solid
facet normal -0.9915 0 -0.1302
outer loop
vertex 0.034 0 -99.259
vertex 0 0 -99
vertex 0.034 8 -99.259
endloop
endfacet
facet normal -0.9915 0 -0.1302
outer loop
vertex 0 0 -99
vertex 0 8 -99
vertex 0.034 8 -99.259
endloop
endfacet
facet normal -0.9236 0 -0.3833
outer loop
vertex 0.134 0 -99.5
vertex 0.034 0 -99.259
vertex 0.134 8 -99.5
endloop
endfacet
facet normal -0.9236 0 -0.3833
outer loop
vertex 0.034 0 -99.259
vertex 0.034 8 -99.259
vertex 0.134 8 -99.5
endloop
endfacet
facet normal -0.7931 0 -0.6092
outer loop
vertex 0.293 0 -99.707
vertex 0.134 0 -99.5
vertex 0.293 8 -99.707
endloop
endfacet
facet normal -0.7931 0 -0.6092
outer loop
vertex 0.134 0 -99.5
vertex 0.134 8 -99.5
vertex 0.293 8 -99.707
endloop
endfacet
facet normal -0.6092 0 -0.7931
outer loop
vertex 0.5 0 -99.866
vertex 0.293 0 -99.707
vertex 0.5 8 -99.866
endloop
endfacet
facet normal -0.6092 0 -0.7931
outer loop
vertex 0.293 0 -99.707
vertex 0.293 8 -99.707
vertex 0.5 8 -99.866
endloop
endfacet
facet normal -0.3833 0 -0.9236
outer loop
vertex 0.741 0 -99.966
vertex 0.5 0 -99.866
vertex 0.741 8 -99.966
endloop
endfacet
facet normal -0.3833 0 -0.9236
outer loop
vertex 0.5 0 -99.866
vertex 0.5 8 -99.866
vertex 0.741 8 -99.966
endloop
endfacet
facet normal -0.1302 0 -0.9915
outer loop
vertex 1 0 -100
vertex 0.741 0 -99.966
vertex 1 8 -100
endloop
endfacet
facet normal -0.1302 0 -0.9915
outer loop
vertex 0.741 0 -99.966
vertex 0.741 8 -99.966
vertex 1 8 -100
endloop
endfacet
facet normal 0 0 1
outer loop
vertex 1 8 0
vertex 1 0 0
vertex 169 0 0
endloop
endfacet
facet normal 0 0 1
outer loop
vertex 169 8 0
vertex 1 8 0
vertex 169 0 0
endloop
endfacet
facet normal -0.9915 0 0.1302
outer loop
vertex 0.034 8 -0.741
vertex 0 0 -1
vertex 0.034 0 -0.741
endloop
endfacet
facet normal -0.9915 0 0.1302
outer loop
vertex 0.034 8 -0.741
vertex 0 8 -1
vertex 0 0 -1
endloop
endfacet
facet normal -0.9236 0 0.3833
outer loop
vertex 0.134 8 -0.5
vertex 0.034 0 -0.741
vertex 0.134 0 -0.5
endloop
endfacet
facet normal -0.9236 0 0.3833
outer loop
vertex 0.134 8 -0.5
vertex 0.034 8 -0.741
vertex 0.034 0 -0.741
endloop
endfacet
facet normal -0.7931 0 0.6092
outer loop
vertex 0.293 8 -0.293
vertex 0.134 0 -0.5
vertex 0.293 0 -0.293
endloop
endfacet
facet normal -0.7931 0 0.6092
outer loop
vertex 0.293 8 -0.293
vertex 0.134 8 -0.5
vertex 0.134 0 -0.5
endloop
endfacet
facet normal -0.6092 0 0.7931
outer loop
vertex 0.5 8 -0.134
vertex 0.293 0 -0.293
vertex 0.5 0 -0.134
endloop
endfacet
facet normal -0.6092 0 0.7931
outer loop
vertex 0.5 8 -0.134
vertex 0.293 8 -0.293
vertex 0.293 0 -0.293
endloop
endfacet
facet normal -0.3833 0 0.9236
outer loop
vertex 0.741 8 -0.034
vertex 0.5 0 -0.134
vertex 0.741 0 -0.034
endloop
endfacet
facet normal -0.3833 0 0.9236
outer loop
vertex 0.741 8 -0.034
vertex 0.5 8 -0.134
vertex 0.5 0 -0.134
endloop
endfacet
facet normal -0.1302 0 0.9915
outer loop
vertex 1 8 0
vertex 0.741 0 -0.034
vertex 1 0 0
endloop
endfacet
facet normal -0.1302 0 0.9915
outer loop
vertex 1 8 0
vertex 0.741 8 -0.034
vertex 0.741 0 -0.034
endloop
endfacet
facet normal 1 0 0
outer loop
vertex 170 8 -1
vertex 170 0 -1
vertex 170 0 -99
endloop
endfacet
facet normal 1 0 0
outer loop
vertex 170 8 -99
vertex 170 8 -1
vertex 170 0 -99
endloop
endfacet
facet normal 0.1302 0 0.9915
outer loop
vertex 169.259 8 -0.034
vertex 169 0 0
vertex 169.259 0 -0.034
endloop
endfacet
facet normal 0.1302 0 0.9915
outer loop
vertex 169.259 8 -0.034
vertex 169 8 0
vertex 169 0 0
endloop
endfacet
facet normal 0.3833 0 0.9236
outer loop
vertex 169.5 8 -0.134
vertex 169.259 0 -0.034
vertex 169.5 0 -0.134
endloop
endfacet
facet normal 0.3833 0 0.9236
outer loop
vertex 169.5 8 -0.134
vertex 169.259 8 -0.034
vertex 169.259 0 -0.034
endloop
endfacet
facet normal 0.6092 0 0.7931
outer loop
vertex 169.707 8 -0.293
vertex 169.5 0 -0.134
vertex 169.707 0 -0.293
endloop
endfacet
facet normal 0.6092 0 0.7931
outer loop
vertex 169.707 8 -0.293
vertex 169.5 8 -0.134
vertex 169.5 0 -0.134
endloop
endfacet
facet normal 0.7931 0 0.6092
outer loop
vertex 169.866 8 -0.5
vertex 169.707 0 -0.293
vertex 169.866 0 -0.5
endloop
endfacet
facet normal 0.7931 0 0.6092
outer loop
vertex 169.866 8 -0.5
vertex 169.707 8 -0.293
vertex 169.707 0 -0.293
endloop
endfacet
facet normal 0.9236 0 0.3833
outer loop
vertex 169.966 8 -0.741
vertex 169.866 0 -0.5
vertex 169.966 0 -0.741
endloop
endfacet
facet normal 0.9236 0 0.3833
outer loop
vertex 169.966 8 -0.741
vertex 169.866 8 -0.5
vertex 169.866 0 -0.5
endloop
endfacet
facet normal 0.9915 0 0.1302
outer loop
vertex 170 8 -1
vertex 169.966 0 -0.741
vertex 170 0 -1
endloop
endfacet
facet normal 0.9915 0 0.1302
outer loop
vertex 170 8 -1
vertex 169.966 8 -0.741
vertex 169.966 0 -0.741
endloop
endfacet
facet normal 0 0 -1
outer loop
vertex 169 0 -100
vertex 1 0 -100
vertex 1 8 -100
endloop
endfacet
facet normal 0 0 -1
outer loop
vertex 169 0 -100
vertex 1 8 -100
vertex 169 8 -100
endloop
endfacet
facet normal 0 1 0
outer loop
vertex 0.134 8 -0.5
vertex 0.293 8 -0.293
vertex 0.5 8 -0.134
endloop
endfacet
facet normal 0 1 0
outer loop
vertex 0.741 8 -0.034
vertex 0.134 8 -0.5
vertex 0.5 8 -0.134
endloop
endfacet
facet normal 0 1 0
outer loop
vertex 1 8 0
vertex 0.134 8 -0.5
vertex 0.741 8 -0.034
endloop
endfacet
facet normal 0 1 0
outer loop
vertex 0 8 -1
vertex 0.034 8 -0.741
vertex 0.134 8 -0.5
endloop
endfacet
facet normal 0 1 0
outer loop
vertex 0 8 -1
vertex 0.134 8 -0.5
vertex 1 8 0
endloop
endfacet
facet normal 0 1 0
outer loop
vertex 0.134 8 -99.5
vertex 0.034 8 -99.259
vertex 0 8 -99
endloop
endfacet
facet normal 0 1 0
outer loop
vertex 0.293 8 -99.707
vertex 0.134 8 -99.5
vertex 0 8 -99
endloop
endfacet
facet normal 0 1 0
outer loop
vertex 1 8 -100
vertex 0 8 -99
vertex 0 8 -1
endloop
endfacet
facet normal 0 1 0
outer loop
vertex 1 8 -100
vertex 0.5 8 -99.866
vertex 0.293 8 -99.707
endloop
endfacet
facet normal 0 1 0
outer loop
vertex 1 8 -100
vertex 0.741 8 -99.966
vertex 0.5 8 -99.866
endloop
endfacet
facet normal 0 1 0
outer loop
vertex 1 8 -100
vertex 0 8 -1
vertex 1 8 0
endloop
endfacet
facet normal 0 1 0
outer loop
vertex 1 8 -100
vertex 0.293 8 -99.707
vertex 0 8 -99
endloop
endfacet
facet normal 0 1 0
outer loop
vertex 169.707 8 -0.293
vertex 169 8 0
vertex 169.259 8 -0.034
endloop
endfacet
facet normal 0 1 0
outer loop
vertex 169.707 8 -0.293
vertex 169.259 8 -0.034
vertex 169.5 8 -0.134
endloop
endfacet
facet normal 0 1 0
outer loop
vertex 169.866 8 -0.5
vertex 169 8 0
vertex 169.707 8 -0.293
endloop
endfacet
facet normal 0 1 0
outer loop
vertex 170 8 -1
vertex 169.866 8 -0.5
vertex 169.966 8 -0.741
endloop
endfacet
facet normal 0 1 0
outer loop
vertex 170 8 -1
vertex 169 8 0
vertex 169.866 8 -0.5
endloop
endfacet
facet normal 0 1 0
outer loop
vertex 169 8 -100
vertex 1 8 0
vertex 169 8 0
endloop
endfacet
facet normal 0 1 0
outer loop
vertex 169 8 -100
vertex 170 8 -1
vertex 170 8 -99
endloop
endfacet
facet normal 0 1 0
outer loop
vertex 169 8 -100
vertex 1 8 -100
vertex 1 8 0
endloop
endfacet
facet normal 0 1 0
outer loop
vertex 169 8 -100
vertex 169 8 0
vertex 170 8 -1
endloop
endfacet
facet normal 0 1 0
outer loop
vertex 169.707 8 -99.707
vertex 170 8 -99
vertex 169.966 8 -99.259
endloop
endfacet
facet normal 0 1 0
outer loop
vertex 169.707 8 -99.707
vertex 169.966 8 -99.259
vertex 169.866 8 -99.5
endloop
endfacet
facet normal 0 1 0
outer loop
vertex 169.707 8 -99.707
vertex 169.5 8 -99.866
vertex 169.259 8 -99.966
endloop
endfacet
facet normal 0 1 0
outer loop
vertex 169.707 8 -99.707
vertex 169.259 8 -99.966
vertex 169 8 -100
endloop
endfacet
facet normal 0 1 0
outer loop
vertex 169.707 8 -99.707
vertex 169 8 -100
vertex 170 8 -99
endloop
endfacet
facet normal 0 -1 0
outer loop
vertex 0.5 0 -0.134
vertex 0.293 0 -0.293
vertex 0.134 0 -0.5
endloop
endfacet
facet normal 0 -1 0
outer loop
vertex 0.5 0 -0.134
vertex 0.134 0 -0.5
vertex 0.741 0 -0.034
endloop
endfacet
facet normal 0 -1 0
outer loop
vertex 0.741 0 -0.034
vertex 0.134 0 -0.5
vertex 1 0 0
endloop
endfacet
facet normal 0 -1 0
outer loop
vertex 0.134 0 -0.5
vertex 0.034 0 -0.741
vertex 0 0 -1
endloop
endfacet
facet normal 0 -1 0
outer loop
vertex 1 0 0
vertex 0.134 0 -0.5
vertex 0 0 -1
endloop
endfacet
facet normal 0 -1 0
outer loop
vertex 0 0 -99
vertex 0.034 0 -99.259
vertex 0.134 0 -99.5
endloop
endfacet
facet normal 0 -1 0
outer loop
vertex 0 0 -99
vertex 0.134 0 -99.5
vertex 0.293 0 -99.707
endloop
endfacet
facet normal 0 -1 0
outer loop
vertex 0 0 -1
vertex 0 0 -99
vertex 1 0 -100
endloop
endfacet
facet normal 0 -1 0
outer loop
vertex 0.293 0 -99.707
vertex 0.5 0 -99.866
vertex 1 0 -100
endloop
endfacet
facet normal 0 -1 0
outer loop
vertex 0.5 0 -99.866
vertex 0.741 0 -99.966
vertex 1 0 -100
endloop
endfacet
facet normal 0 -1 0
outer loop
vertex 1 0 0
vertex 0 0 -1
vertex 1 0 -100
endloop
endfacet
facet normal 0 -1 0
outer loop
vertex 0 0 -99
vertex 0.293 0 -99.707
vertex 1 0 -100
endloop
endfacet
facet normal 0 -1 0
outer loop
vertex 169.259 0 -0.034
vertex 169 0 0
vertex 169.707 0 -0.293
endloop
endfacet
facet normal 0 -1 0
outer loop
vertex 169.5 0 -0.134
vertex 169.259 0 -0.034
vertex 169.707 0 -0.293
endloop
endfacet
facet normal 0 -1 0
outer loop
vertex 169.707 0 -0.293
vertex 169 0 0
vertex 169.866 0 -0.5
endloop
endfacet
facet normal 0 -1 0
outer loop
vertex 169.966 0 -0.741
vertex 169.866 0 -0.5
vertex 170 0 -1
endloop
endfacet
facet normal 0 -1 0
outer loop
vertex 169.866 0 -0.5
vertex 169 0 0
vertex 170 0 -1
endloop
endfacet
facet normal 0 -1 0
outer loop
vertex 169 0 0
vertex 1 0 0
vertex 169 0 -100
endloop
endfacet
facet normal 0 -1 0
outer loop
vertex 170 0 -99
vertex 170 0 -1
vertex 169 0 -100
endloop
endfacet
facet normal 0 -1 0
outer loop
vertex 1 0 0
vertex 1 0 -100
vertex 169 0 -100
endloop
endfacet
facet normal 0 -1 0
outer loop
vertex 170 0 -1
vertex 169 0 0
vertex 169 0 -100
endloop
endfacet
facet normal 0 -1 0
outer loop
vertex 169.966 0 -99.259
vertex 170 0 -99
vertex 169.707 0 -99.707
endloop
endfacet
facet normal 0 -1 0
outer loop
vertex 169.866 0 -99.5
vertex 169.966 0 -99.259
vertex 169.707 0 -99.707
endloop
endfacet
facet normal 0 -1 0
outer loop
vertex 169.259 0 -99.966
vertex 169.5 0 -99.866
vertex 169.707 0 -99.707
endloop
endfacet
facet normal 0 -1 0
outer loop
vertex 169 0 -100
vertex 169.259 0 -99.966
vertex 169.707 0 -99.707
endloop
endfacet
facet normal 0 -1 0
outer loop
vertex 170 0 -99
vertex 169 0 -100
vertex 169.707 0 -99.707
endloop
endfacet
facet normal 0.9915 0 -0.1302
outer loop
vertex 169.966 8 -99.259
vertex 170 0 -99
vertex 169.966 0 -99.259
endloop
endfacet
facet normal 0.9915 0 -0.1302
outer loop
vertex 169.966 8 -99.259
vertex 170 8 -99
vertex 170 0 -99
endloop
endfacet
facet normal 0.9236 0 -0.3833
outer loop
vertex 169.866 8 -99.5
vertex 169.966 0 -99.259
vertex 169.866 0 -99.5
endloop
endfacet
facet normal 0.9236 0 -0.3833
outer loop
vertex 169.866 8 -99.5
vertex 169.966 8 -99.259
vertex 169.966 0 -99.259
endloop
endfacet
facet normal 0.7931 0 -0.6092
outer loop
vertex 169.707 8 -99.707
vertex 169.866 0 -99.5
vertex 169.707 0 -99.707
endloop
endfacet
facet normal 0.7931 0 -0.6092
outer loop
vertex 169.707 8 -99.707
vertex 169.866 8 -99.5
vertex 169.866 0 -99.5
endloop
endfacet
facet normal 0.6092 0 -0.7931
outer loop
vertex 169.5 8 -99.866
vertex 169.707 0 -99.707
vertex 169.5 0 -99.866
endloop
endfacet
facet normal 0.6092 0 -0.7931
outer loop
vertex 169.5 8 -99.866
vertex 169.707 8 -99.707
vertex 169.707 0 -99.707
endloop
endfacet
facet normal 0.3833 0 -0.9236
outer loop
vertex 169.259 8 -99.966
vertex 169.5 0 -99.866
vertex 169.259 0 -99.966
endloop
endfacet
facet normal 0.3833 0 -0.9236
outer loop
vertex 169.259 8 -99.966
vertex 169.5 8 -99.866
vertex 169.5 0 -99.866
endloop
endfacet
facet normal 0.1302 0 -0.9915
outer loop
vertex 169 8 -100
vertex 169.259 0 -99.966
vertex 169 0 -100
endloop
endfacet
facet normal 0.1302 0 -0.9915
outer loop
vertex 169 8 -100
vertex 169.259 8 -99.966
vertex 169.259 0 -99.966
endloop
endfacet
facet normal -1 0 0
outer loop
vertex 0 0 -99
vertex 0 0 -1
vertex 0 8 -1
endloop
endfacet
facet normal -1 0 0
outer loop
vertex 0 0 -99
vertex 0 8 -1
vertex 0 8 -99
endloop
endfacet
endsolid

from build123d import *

# Parameters (mm, degrees)
SKETCH_1_W      = 170
SKETCH_1_H      = 100
EXTRUDE_1_DEPTH = 8
FILLET_1_R      = 1


with BuildPart() as part:
    # 草图1 → 凸台-拉伸1 (new body)
    with BuildSketch(Plane(origin=(0, 0, 0), x_dir=(1, 0, 0), z_dir=(0, 1, 0))):
        with Locations((85, 50)):
            Rectangle(SKETCH_1_W, SKETCH_1_H)
    extrude(amount=EXTRUDE_1_DEPTH)

    # 圆角1
    fillet_1_edges = [part.edges().sort_by_distance(p)[0] for p in [
        (0, 4, -100),
        (170, 4, -100),
        (170, 4, 0),
        (0, 4, 0),
    ]]
    fillet(fillet_1_edges, radius=FILLET_1_R)


solid = part.part
